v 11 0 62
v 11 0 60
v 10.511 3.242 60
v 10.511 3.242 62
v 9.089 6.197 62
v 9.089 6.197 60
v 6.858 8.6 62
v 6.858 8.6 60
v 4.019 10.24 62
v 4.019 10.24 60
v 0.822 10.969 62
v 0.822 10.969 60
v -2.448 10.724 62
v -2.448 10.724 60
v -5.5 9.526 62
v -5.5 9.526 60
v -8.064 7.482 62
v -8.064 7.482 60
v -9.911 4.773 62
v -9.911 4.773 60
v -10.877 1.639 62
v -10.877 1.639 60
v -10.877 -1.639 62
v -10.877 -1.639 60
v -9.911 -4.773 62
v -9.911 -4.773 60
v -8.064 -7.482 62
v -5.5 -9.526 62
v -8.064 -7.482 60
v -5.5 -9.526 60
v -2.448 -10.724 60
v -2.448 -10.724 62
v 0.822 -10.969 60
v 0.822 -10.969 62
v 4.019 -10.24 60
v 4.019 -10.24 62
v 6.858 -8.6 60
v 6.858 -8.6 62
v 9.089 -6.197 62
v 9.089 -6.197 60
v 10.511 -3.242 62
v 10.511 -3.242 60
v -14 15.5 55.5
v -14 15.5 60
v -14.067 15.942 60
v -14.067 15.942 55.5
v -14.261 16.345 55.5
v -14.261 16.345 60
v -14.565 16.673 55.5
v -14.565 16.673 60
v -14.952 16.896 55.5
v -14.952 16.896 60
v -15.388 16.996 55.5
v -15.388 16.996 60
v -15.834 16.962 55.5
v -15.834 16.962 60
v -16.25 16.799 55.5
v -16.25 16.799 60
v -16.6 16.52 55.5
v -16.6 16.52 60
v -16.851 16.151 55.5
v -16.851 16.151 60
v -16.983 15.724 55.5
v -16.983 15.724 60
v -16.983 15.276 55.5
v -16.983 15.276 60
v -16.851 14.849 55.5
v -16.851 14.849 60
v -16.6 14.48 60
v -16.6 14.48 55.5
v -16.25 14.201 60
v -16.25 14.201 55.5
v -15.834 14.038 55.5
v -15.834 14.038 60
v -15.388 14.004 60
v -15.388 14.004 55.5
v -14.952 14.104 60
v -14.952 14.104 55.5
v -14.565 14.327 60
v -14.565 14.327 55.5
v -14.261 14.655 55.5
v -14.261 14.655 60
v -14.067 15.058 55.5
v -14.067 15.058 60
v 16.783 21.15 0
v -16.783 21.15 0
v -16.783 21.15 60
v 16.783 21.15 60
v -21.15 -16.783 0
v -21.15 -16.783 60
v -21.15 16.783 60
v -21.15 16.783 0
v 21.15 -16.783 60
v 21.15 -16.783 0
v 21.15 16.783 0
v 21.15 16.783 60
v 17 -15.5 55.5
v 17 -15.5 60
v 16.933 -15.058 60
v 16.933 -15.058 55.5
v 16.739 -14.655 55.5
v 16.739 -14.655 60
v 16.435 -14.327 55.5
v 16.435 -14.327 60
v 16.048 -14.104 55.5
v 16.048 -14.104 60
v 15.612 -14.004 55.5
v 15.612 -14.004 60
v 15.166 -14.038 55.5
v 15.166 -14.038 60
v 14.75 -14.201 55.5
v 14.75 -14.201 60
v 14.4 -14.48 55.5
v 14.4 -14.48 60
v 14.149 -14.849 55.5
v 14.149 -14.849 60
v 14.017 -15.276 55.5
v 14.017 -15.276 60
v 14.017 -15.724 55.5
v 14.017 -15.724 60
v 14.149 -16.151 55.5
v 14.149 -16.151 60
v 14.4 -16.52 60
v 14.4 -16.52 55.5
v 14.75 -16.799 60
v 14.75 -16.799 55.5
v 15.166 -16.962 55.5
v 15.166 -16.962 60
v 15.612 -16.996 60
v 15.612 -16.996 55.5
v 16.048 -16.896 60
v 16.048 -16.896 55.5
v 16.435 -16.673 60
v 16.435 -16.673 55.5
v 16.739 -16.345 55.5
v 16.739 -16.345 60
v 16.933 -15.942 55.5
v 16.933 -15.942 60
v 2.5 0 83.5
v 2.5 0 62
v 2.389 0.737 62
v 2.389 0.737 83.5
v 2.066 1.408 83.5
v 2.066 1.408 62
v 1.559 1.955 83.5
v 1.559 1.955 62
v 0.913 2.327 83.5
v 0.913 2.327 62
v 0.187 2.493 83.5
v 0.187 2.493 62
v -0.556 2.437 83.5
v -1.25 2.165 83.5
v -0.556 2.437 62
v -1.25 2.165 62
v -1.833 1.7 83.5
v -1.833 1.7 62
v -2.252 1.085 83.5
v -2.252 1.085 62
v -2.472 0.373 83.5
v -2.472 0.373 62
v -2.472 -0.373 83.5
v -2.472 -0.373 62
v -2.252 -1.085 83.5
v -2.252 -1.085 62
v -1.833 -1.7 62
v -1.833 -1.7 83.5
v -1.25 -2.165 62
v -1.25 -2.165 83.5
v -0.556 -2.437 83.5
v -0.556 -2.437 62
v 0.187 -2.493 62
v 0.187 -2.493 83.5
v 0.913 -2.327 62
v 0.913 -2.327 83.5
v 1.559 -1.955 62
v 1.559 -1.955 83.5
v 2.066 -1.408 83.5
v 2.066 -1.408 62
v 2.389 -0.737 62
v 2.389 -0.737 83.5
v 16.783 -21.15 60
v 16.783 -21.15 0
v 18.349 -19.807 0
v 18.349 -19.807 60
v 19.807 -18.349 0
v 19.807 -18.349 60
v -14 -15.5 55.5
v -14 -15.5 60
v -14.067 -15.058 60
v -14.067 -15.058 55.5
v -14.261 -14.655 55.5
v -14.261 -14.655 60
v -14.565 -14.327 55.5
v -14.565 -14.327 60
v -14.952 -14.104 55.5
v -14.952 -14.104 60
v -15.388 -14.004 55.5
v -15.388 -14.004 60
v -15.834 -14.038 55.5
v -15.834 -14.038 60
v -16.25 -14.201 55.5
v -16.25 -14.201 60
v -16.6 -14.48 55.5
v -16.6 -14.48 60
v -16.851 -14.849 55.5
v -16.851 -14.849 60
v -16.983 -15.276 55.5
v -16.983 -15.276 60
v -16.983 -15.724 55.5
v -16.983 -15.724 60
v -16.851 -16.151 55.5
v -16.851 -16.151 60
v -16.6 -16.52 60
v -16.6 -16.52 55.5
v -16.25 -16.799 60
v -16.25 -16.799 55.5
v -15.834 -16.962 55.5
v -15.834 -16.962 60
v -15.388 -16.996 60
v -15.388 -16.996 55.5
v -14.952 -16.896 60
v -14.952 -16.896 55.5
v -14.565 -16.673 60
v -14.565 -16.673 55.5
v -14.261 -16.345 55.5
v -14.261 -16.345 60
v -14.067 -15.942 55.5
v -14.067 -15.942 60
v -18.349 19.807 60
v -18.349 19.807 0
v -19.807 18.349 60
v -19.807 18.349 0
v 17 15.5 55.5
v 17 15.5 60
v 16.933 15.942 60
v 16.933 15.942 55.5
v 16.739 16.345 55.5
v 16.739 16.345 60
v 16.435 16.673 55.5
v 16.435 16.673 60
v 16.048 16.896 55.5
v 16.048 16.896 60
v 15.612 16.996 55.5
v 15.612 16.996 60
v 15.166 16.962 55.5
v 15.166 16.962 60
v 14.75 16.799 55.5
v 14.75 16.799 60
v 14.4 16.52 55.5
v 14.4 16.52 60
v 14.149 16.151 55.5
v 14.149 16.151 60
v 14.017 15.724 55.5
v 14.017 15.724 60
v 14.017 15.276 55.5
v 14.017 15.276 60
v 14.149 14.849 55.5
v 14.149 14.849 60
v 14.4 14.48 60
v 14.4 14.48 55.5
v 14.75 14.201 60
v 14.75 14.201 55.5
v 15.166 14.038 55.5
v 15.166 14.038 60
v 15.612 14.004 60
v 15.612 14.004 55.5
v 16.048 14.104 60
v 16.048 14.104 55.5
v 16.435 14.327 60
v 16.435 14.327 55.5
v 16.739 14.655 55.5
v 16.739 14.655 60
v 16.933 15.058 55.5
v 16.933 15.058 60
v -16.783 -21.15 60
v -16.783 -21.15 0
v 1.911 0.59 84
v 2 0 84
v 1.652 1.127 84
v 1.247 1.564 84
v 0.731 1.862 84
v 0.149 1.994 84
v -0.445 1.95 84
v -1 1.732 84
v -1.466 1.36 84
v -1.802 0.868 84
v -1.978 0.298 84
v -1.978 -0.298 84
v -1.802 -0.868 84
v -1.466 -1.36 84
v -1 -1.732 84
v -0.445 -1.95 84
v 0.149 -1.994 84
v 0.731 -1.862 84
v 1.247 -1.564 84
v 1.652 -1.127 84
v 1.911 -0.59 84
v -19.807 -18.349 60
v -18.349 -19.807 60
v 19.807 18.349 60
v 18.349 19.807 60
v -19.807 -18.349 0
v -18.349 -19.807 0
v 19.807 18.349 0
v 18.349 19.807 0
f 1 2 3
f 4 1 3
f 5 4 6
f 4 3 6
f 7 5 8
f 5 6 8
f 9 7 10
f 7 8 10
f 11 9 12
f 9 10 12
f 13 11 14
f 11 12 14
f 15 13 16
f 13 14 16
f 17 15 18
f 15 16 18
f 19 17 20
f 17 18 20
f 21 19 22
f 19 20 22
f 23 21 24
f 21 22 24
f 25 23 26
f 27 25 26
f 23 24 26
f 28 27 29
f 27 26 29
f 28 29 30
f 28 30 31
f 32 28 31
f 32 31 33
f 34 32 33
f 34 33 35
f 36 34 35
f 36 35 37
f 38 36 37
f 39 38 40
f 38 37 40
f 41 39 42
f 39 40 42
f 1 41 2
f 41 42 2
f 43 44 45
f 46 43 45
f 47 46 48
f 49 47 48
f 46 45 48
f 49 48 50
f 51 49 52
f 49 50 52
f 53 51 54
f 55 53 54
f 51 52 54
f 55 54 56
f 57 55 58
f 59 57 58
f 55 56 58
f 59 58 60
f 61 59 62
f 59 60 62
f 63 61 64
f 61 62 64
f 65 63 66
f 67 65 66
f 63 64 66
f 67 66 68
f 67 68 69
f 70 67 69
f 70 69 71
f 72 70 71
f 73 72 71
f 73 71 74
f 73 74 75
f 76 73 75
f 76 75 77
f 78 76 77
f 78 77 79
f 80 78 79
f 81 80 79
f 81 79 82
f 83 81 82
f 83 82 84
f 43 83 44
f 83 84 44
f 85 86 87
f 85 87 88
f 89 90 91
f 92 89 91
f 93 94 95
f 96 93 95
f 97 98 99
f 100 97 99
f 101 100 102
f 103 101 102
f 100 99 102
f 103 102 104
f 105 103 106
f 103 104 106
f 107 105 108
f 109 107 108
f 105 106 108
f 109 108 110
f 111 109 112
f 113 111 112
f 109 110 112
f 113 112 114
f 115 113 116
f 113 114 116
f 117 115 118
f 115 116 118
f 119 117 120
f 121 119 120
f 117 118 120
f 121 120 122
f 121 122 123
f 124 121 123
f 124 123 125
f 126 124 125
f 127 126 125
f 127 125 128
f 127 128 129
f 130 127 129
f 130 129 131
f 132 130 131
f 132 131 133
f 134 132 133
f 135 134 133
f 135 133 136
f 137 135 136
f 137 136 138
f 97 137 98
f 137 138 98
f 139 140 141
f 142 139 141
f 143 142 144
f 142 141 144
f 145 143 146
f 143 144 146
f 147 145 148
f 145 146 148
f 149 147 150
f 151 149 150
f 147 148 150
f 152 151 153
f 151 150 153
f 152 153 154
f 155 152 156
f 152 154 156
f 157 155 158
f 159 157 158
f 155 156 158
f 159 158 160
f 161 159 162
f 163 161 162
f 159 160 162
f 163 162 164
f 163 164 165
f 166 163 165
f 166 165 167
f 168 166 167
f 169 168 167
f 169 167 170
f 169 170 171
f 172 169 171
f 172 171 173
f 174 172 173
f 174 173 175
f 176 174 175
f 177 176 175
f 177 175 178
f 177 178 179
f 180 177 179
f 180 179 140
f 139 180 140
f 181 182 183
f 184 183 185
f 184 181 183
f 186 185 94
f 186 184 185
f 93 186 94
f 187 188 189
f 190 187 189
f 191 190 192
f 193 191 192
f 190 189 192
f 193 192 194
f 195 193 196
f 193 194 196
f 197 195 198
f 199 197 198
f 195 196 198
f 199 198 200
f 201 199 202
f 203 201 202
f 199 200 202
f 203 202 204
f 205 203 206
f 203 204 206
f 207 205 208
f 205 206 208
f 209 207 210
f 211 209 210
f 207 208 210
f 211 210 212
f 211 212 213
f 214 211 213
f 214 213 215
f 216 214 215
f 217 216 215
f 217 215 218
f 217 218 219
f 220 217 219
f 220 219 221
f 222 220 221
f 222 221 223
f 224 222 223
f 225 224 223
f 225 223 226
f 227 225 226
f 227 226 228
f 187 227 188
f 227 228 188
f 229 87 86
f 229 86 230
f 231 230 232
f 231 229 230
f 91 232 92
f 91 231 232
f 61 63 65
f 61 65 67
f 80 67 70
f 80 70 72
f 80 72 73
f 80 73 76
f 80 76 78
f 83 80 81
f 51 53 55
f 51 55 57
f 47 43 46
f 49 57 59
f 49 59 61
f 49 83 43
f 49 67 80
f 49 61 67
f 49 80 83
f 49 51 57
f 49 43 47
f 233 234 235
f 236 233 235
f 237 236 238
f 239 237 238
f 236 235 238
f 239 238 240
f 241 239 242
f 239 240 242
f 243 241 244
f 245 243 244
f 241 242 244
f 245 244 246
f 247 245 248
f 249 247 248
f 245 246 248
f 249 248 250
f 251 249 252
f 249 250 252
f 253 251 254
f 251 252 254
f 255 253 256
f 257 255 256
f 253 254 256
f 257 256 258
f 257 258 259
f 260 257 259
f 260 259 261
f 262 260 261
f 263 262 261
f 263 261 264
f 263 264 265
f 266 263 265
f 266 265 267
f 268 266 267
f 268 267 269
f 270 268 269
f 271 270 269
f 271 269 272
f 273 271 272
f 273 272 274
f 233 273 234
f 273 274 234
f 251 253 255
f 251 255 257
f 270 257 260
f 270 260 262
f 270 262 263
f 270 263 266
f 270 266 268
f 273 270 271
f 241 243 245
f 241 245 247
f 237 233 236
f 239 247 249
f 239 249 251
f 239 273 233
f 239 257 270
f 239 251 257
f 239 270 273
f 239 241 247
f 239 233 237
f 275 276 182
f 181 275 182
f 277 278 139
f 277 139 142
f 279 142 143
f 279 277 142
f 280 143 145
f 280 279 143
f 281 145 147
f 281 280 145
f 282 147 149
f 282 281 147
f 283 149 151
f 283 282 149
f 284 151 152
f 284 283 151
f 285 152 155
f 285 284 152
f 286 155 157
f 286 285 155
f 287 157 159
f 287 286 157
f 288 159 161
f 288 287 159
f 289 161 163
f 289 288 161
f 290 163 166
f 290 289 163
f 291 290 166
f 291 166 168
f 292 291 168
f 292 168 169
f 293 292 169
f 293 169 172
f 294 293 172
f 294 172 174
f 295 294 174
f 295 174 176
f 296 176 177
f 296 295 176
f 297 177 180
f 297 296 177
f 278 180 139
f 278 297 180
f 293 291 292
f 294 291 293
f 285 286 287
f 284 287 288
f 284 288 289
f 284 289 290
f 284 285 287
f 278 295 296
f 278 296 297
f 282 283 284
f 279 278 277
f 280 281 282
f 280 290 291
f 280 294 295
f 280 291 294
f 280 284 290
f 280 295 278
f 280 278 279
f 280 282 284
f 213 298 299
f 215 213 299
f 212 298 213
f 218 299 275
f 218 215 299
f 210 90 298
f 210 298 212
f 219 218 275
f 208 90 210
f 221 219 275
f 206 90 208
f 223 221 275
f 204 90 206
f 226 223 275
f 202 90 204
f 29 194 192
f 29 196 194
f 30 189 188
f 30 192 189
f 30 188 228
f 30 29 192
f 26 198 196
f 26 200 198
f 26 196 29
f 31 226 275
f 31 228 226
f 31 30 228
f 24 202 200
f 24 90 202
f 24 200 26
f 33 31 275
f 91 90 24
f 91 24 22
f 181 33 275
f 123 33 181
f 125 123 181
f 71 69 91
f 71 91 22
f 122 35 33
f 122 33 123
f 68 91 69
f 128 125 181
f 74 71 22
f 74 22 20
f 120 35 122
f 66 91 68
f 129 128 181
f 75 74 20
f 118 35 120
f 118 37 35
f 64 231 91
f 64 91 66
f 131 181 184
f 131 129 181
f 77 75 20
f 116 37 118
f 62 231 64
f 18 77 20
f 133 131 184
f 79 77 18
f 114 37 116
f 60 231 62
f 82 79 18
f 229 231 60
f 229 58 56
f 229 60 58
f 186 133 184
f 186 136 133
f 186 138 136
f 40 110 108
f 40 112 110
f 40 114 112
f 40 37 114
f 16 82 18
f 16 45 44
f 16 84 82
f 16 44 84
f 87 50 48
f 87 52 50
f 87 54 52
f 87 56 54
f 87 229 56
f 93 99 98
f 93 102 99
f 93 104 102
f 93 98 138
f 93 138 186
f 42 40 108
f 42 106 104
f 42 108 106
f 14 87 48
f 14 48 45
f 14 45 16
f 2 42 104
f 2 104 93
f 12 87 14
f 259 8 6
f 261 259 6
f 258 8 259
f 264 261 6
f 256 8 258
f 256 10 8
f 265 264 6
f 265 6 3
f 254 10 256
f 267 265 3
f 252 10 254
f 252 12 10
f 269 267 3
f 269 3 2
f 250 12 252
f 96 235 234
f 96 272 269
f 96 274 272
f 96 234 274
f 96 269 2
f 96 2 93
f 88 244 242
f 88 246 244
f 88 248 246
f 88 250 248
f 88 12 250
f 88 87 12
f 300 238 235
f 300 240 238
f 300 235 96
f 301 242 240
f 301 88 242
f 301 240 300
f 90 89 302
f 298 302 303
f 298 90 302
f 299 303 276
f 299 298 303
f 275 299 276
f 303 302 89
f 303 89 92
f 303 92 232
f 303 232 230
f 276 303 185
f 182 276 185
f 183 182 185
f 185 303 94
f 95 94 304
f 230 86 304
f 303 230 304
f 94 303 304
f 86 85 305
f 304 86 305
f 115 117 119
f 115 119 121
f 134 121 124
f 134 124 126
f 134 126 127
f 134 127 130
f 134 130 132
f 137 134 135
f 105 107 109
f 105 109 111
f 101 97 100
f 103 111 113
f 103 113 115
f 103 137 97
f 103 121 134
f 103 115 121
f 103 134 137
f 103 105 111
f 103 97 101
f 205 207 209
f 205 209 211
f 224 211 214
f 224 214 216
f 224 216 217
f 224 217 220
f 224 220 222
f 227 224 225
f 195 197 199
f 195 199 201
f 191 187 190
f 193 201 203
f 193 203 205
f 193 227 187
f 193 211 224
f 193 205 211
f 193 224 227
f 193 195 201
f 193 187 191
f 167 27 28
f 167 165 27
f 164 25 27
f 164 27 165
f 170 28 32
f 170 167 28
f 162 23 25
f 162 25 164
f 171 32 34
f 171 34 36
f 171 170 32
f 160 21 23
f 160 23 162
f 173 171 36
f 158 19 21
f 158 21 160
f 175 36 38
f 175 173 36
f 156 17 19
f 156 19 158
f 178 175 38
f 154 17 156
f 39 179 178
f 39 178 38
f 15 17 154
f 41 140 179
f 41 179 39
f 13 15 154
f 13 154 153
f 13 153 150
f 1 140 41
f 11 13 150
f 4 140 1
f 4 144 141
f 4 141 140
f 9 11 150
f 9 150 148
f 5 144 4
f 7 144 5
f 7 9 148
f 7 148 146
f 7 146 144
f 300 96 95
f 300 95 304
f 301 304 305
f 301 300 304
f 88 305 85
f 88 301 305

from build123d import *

# Parameters (mm, degrees)
SKETCH1_W           = 42.3
SKETCH1_H           = 42.3
BOSS_EXTRUDE1_DEPTH = 60
SKETCH2_R           = 1.5
CUT_EXTRUDE1_DEPTH  = 4.5
SKETCH3_W           = 70.080041738
SKETCH3_H           = 62.101106944
SKETCH3_R           = 27
CUT_EXTRUDE2_DEPTH  = 68.04211363
SKETCH4_R           = 11
BOSS_EXTRUDE2_DEPTH = 2
SKETCH5_R           = 2.5
BOSS_EXTRUDE3_DEPTH = 24
CHAMFER1_SIZE       = 0.5


with BuildPart() as part:
    # Sketch1 → Boss-Extrude1 (new body)
    with BuildSketch(Plane.XY):
        Rectangle(SKETCH1_W, SKETCH1_H)
    extrude(amount=BOSS_EXTRUDE1_DEPTH)

    # Sketch2 → Cut-Extrude1 (cut)
    with BuildSketch(Plane.XY.offset(60)):
        with Locations((-15.5, 15.5)):
            Circle(SKETCH2_R)
        with Locations((-15.5, -15.5)):
            Circle(SKETCH2_R)
        with Locations((15.5, -15.5)):
            Circle(SKETCH2_R)
        with Locations((15.5, 15.5)):
            Circle(SKETCH2_R)
    extrude(amount=-CUT_EXTRUDE1_DEPTH, mode=Mode.SUBTRACT)

    # Sketch3 → Cut-Extrude2 (cut, through all)
    with BuildSketch(Plane.XY.offset(60)):
        Rectangle(SKETCH3_W, SKETCH3_H)
        Circle(SKETCH3_R, mode=Mode.SUBTRACT)
    extrude(amount=-CUT_EXTRUDE2_DEPTH, mode=Mode.SUBTRACT)

    # Sketch4 → Boss-Extrude2 (add)
    with BuildSketch(Plane.XY.offset(60)):
        Circle(SKETCH4_R)
    extrude(amount=BOSS_EXTRUDE2_DEPTH)

    # Sketch5 → Boss-Extrude3 (add)
    with BuildSketch(Plane.XY.offset(60)):
        Circle(SKETCH5_R)
    extrude(amount=BOSS_EXTRUDE3_DEPTH)

    # Chamfer1
    chamfer1_edges = [part.edges().sort_by_distance(p)[0] for p in [
        (-2.5, 0, 84),
    ]]
    chamfer(chamfer1_edges, length=CHAMFER1_SIZE)


solid = part.part
